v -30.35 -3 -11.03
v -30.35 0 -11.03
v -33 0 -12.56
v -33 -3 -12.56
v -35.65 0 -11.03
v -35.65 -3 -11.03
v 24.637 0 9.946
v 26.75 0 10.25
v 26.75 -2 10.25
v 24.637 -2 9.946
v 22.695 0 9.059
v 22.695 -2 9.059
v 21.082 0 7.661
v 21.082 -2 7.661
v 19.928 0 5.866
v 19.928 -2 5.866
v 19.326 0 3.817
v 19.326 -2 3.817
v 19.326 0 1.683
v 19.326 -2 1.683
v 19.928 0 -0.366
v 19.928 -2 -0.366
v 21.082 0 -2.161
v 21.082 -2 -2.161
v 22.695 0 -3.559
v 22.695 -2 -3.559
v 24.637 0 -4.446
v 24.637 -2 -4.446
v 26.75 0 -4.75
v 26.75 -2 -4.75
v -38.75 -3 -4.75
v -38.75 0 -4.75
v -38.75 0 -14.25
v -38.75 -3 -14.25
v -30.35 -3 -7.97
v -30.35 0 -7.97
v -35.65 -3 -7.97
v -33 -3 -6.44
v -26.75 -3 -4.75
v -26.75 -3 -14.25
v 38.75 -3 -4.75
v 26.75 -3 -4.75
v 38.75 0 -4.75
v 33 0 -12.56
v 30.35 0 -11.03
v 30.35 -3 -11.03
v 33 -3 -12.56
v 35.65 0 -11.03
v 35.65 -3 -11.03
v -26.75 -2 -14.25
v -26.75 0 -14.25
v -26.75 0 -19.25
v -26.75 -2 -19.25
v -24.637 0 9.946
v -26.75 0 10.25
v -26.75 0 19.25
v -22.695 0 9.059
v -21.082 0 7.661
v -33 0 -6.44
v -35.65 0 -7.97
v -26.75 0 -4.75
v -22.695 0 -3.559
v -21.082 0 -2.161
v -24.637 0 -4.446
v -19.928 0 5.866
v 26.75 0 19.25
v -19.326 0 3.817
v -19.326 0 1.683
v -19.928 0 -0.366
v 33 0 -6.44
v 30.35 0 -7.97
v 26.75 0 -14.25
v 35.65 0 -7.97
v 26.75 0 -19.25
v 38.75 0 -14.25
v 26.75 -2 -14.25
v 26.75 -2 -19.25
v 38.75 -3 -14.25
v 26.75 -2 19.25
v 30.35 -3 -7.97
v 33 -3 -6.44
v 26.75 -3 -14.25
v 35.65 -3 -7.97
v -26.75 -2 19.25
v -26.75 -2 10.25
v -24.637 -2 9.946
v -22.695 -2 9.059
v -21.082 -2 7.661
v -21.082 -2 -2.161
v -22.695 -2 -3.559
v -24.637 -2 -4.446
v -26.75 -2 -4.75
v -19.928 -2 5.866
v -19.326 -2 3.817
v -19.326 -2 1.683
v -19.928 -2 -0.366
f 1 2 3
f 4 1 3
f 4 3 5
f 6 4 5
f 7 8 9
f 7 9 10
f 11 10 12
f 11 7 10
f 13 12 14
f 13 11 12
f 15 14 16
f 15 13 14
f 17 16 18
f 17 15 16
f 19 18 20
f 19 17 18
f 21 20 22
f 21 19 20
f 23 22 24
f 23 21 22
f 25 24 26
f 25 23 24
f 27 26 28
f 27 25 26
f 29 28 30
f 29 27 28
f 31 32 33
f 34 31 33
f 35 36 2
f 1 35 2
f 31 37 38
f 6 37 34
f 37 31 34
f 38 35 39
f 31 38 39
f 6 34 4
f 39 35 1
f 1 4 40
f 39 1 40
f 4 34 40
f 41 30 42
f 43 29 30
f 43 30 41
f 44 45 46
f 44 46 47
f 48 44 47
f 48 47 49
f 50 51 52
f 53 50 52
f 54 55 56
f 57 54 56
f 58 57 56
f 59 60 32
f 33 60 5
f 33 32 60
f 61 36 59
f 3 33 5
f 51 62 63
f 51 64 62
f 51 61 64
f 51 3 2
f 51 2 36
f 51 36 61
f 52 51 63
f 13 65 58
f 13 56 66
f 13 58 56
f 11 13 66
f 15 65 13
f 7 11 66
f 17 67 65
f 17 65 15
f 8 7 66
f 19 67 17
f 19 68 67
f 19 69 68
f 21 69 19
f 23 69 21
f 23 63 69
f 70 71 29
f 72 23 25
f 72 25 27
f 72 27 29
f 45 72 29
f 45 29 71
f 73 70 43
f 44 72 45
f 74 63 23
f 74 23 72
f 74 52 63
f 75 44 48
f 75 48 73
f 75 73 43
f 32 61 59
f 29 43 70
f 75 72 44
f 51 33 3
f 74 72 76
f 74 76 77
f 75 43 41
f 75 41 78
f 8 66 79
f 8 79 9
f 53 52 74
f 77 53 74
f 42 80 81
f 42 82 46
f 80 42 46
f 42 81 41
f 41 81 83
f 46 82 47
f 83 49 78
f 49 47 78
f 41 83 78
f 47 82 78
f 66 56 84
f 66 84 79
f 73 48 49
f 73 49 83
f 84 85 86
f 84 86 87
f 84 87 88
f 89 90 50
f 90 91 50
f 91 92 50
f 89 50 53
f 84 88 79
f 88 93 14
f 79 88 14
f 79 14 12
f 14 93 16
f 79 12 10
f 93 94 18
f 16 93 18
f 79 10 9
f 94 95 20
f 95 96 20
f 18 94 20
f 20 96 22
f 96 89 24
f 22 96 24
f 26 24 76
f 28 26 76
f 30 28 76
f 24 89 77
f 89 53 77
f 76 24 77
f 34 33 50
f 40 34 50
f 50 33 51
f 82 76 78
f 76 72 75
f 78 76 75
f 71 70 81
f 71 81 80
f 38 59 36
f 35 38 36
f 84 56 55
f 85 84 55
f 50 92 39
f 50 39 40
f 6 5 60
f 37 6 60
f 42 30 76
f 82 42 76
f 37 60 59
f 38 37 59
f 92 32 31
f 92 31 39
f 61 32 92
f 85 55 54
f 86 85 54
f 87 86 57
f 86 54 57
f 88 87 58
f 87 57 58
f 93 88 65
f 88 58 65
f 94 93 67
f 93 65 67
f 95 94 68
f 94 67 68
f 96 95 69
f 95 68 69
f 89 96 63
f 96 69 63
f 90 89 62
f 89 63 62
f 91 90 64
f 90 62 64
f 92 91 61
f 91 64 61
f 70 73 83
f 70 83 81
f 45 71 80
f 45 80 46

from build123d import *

# Parameters (mm, degrees)
SKETCH1_W           = 53.5
SKETCH1_H           = 38.5
BOSS_EXTRUDE1_DEPTH = 2
SKETCH2_W           = 12
SKETCH2_H           = 9.5
BOSS_EXTRUDE2_DEPTH = 3
CUT_EXTRUDE1_DEPTH  = 2


with BuildPart() as part:
    # Sketch1 → Boss-Extrude1 (new body)
    with BuildSketch(Plane(origin=(0, 0, 0), x_dir=(1, 0, 0), z_dir=(0, 1, 0))):
        Rectangle(SKETCH1_W, SKETCH1_H)
    extrude(amount=-BOSS_EXTRUDE1_DEPTH)

    # Sketch2 → Boss-Extrude2 (add)
    # profile 1 of 2: a face of its own
    with BuildSketch(Plane(origin=(0, 0, 0), x_dir=(1, 0, 0), z_dir=(0, 1, 0))):
        with Locations((-32.75, 9.5)):
            Rectangle(SKETCH2_W, SKETCH2_H)
        Polygon((-33, 6.440043573), (-30.35, 7.970021787), (-30.35, 11.029978213), (-33, 12.559956427), (-35.65, 11.029978213), (-35.65, 7.970021787), align=None, mode=Mode.SUBTRACT)
    # profile 2 of 2: a face of its own
    with BuildSketch(Plane(origin=(0, 0, 0), x_dir=(1, 0, 0), z_dir=(0, 1, 0))):
        with Locations((32.75, 9.5)):
            Rectangle(SKETCH2_W, SKETCH2_H)
        Polygon((35.65, 7.970021787), (33, 6.440043573), (30.35, 7.970021787), (30.35, 11.029978213), (33, 12.559956427), (35.65, 11.029978213), align=None, mode=Mode.SUBTRACT)
    extrude(amount=-BOSS_EXTRUDE2_DEPTH)

    # Sketch3 → Cut-Extrude1 (cut)
    with BuildSketch(Plane(origin=(0, 0, 0), x_dir=(1, 0, 0), z_dir=(0, 1, 0))):
        with BuildLine():
            Line((-26.75, 4.75), (-26.75, -10.25))
            ThreePointArc((-26.75, -10.25), (-19.25, -2.75), (-26.75, 4.75))
        make_face()
        with BuildLine():
            Line((26.75, 4.75), (26.75, -10.25))
            ThreePointArc((26.75, -10.25), (19.25, -2.75), (26.75, 4.75))
        make_face()
    extrude(amount=-CUT_EXTRUDE1_DEPTH, mode=Mode.SUBTRACT)


solid = part.part
